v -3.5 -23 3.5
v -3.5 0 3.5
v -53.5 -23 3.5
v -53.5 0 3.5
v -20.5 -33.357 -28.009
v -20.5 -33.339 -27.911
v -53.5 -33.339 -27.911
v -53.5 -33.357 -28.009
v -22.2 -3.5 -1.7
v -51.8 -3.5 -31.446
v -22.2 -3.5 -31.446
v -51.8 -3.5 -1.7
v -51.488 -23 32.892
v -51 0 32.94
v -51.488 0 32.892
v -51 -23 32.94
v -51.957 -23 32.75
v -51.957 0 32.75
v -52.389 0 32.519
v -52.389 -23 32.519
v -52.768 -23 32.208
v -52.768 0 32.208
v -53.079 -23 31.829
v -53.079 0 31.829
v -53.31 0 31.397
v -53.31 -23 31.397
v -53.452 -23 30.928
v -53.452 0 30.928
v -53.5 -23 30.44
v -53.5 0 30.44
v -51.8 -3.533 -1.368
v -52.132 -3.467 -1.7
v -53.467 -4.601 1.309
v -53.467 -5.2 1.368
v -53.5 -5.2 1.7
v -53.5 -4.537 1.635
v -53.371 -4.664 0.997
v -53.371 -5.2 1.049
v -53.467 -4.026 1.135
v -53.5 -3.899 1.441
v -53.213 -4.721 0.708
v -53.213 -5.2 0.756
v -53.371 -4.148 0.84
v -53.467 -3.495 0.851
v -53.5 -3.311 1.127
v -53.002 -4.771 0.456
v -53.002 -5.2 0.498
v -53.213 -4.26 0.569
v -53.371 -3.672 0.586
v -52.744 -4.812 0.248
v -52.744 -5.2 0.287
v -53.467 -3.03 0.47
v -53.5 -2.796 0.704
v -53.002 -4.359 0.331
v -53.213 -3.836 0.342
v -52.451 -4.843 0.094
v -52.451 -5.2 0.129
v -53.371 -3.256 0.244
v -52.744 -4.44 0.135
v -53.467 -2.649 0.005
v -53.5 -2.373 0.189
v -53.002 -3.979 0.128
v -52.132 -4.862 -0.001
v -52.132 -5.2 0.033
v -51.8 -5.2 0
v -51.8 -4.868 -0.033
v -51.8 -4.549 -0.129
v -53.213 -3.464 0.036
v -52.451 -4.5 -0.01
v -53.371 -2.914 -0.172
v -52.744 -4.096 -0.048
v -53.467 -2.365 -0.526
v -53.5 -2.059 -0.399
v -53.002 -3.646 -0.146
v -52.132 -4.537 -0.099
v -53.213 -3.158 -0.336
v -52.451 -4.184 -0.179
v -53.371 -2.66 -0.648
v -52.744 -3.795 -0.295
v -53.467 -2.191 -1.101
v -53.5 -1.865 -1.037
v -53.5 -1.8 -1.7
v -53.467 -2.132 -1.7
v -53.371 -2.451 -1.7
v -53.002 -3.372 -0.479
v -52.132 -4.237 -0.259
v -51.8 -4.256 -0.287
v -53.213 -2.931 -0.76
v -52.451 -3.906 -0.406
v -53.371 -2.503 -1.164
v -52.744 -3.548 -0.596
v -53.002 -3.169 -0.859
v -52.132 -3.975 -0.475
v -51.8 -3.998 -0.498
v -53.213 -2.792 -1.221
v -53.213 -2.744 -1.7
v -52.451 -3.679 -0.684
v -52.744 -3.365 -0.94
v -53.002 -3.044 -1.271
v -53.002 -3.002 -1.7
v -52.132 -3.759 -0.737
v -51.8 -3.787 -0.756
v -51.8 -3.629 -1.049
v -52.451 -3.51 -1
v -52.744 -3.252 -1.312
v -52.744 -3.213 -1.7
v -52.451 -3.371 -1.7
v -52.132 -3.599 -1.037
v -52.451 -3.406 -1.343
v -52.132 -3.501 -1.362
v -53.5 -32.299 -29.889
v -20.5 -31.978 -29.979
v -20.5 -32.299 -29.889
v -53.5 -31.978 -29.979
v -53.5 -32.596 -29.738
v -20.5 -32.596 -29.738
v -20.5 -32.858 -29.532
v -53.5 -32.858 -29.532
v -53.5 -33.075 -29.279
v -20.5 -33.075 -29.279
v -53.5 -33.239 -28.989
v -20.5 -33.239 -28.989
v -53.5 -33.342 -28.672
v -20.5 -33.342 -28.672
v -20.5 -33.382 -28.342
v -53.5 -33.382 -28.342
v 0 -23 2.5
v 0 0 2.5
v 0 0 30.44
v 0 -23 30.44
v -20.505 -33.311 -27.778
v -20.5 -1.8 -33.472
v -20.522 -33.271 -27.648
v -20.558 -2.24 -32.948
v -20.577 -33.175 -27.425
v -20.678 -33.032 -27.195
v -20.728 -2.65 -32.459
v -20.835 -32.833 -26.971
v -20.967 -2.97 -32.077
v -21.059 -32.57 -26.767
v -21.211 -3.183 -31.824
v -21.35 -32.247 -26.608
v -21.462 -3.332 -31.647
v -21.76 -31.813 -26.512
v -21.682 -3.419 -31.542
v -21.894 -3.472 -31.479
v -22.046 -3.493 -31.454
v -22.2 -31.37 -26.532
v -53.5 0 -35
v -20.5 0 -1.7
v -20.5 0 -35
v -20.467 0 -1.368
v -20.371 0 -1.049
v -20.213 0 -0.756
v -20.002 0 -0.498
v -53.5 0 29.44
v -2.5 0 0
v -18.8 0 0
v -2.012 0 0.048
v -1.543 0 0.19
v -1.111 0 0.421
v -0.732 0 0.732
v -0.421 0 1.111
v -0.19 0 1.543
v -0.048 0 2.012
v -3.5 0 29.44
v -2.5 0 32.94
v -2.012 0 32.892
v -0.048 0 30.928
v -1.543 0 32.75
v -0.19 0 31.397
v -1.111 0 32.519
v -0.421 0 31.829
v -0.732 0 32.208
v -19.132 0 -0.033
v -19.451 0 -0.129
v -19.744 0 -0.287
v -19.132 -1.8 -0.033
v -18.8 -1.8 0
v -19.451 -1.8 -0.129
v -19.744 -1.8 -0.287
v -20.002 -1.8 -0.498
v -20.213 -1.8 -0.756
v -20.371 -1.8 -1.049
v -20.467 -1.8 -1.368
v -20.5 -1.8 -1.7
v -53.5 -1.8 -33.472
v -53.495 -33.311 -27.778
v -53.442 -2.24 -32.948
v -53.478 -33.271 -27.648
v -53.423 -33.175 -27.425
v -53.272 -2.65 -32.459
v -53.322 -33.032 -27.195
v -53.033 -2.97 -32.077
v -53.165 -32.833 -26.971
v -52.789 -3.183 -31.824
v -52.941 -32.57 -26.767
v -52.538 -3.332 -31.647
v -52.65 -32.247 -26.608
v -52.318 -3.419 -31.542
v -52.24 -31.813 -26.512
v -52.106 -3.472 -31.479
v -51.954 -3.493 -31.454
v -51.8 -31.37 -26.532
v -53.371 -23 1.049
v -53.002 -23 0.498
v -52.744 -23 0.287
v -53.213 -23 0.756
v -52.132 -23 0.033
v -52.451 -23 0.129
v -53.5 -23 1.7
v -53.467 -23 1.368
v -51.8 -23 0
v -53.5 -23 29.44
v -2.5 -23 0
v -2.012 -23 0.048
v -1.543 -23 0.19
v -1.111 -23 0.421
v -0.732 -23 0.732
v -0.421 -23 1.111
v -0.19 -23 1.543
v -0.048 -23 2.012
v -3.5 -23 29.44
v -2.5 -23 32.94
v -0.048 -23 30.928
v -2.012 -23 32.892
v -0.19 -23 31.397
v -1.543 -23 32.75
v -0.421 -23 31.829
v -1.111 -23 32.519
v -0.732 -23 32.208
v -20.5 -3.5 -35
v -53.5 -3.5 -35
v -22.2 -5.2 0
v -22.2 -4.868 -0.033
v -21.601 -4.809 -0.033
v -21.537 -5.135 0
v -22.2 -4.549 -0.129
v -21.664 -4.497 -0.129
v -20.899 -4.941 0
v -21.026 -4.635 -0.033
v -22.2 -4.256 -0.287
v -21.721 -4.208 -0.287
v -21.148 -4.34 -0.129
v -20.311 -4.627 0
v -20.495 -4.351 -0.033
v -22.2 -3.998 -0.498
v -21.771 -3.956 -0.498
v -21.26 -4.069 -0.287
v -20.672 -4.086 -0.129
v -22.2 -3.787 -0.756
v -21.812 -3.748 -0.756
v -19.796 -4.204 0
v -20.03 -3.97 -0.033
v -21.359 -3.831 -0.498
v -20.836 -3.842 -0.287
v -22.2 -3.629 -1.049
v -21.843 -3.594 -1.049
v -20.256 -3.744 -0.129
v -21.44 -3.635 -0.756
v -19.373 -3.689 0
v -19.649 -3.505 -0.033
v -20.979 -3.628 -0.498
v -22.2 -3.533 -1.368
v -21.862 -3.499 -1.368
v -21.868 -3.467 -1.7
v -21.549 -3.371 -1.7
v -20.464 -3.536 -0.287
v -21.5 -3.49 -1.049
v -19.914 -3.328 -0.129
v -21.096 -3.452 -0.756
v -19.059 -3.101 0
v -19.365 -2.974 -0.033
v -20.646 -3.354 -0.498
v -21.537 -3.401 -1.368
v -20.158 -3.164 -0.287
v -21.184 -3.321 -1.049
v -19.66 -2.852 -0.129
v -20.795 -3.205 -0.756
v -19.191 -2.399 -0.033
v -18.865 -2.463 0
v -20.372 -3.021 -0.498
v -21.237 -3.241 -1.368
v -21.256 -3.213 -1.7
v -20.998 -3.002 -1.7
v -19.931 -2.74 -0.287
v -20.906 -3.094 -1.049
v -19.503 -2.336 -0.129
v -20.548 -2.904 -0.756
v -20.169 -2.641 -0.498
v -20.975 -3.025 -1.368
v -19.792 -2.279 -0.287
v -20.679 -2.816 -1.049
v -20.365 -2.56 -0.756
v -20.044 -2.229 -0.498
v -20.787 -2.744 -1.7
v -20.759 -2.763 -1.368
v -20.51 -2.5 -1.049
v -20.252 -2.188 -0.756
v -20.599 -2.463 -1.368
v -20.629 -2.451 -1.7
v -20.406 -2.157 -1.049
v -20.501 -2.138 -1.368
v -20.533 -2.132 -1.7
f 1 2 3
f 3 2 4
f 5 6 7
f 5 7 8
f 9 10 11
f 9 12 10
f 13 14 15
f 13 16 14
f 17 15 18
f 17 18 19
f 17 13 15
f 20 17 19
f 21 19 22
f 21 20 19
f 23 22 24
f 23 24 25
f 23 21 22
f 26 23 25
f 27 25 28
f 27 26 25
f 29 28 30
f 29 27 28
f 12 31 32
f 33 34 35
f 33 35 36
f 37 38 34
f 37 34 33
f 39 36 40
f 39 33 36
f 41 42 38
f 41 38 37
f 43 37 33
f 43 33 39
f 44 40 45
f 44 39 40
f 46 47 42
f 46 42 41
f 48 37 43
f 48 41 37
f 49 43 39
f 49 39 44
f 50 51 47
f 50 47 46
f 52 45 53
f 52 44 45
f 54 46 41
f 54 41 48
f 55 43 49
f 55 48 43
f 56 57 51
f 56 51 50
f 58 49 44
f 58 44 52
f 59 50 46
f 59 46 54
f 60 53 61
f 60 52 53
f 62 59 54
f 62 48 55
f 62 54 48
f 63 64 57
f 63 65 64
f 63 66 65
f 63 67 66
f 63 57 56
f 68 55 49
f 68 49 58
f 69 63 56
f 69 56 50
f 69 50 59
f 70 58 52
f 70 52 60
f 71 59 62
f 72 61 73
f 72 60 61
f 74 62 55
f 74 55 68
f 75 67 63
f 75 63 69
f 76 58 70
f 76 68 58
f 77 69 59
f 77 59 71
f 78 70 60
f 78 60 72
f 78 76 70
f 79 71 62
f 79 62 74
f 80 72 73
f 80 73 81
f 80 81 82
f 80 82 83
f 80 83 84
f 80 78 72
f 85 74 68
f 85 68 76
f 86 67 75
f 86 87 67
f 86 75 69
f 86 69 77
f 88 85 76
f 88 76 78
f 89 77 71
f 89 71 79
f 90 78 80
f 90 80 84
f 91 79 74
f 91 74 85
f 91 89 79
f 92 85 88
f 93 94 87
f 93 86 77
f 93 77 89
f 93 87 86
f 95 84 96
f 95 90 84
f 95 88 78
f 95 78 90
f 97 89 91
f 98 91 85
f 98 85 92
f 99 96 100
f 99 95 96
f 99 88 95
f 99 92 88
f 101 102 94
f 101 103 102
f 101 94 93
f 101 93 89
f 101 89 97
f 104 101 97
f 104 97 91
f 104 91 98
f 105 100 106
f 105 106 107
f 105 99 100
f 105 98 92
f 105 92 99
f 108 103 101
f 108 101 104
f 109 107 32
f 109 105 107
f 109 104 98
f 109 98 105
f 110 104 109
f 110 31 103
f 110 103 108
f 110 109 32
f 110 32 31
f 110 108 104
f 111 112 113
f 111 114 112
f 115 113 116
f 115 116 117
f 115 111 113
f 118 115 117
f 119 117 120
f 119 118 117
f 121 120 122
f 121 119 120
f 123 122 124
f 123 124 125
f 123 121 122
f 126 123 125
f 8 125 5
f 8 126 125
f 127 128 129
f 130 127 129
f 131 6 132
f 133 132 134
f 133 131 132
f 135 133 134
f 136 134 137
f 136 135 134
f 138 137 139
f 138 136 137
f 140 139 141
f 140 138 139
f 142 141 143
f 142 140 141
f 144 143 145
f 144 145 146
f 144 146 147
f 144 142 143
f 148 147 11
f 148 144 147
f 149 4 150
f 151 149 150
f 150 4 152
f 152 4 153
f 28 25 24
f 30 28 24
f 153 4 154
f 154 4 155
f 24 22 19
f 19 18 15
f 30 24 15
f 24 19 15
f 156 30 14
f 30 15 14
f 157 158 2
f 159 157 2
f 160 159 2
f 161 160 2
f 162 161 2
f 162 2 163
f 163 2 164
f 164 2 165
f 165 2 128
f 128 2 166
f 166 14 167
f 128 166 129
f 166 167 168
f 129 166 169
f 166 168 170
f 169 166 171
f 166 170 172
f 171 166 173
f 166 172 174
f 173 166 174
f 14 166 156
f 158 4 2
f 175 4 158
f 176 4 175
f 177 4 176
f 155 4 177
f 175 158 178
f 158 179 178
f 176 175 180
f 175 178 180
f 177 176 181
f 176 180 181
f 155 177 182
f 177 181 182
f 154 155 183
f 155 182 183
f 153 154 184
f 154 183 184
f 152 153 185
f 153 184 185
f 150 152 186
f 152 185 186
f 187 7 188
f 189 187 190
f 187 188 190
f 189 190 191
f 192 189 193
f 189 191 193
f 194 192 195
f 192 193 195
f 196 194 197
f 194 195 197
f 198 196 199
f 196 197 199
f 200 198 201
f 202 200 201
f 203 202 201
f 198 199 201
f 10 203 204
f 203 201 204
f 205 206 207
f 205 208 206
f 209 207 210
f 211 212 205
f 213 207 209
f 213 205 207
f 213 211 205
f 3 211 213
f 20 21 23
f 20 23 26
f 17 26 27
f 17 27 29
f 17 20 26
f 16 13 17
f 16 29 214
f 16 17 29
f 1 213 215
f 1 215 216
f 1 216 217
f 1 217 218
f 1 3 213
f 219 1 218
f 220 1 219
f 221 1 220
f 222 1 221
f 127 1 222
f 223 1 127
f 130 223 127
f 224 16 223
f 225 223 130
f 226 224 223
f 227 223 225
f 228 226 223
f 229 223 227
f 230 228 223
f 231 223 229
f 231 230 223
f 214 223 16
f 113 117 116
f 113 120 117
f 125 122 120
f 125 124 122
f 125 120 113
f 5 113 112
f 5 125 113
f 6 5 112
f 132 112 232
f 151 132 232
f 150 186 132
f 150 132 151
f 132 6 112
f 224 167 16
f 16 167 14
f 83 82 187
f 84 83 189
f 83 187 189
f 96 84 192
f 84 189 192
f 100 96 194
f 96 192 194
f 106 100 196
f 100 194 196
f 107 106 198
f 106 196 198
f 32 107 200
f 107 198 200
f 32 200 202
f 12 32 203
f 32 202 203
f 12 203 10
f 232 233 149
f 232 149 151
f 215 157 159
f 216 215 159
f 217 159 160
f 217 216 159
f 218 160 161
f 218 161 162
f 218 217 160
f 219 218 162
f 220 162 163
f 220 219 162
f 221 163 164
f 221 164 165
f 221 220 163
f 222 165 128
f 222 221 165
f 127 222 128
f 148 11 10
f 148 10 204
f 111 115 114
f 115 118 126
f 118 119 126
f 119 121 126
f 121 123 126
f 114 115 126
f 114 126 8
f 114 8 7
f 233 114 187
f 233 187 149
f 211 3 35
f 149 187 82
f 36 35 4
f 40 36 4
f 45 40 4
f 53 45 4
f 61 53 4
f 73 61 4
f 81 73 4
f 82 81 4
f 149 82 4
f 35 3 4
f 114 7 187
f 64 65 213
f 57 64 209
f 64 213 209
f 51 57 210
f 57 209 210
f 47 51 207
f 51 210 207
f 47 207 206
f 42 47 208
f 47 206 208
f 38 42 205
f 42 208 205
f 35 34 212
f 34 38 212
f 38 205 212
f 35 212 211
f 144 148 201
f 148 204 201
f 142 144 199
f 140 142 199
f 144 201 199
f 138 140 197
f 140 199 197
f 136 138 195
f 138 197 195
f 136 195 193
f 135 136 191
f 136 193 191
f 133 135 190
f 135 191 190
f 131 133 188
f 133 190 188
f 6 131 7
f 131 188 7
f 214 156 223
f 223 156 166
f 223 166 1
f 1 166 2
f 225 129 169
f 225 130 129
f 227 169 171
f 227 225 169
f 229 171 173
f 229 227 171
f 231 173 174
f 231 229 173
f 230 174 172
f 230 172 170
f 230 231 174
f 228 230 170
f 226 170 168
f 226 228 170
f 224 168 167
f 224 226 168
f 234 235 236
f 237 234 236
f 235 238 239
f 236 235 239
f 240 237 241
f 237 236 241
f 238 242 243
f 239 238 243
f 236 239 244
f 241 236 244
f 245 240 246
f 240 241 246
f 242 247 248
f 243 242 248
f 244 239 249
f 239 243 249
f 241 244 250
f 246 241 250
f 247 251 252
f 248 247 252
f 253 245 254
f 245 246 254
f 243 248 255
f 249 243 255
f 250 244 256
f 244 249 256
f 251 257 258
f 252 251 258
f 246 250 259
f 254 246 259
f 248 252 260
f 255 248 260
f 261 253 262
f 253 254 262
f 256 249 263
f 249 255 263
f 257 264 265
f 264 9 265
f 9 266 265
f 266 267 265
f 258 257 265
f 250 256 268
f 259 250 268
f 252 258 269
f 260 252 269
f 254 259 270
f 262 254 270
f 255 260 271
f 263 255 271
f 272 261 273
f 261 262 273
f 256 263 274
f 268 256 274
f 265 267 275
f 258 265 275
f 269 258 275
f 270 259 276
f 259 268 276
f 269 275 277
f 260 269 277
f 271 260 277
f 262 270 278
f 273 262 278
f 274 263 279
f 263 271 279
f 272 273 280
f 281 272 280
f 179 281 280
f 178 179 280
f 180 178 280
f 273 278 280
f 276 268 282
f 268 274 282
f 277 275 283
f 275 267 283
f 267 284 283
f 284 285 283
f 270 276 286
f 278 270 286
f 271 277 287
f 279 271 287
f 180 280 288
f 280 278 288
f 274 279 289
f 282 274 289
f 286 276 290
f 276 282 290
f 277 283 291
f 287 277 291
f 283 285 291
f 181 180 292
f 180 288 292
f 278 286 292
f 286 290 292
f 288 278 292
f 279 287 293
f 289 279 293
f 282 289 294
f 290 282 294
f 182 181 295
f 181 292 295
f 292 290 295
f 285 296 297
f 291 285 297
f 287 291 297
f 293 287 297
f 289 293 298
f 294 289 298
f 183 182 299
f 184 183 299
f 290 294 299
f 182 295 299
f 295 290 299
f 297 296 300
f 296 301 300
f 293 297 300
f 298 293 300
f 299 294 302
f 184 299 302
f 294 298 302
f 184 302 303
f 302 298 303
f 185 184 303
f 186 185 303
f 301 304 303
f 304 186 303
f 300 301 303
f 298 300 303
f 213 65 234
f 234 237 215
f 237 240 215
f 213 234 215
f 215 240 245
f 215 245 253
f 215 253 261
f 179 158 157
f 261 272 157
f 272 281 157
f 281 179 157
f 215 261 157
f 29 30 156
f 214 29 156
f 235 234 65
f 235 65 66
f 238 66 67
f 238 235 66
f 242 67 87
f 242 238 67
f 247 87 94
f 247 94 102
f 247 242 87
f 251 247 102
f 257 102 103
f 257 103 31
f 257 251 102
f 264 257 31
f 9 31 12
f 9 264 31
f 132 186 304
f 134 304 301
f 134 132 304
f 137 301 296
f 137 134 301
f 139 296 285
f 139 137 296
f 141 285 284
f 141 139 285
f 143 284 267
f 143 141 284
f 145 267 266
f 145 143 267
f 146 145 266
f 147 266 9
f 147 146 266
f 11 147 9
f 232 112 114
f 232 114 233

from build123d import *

# Parameters (mm, degrees)
F1_DEPTH = 23
F2_W     = 33
F2_H     = 3.5
F3_DEPTH = 35
F5_DEPTH = 33
F6_R     = 2.5
F7_R     = 1.7


with BuildPart() as f1:
    # F0 (on Front) → F1 (new body)
    with BuildSketch(Plane.XZ):
        Polygon((-53.5, 32.94), (-53.5, 29.44), (-3.5, 29.44), (-3.5, 3.5), (-53.5, 3.5), (-53.5, 0), (0, 0), (0, 32.94), align=None)
    extrude(amount=F1_DEPTH)

    # F2 (on face) → F3 (join)
    with BuildSketch(Plane(origin=(0, 0, 0), x_dir=(1, 0, 0), z_dir=(0, 0, -1))):
        with Locations((-37, 1.75)):
            Rectangle(F2_W, F2_H)
    extrude(amount=F3_DEPTH)

    # F4 (on face) → F5 (join, through all)
    with BuildSketch(Plane.YZ.offset(-20.5)):
        Polygon((-33.6520012122, -29.6833886639), (-3.5, -35), (-3.5, -31.4460068584), (-33.0442325904, -26.2365615284), align=None)
    extrude(amount=-F5_DEPTH)

    # F6
    f6_edges = [f1.edges().sort_by_distance(p)[0] for p in [
        (-53.5, -11.5, 32.94),
        (0, -11.5, 32.94),
        (0, -11.5, 0),
    ]]
    fillet(f6_edges, radius=F6_R)

    # F7
    f7_edges = [f1.edges().sort_by_distance(p)[0] for p in [
        (-37, -33.652001, -29.683389),
        (-37, -33.044233, -26.236562),
        (-20.5, -18.272116, -28.841284),
        (-53.5, -18.272116, -28.841284),
        (-20.5, -3.5, -15.723003),
        (-37, -3.5, 0),
        (-53.5, -13.25, 0),
        (-53.5, -3.5, -15.723003),
        (-20.5, -1.75, 0),
    ]]
    fillet(f7_edges, radius=F7_R)


solid = f1.part
